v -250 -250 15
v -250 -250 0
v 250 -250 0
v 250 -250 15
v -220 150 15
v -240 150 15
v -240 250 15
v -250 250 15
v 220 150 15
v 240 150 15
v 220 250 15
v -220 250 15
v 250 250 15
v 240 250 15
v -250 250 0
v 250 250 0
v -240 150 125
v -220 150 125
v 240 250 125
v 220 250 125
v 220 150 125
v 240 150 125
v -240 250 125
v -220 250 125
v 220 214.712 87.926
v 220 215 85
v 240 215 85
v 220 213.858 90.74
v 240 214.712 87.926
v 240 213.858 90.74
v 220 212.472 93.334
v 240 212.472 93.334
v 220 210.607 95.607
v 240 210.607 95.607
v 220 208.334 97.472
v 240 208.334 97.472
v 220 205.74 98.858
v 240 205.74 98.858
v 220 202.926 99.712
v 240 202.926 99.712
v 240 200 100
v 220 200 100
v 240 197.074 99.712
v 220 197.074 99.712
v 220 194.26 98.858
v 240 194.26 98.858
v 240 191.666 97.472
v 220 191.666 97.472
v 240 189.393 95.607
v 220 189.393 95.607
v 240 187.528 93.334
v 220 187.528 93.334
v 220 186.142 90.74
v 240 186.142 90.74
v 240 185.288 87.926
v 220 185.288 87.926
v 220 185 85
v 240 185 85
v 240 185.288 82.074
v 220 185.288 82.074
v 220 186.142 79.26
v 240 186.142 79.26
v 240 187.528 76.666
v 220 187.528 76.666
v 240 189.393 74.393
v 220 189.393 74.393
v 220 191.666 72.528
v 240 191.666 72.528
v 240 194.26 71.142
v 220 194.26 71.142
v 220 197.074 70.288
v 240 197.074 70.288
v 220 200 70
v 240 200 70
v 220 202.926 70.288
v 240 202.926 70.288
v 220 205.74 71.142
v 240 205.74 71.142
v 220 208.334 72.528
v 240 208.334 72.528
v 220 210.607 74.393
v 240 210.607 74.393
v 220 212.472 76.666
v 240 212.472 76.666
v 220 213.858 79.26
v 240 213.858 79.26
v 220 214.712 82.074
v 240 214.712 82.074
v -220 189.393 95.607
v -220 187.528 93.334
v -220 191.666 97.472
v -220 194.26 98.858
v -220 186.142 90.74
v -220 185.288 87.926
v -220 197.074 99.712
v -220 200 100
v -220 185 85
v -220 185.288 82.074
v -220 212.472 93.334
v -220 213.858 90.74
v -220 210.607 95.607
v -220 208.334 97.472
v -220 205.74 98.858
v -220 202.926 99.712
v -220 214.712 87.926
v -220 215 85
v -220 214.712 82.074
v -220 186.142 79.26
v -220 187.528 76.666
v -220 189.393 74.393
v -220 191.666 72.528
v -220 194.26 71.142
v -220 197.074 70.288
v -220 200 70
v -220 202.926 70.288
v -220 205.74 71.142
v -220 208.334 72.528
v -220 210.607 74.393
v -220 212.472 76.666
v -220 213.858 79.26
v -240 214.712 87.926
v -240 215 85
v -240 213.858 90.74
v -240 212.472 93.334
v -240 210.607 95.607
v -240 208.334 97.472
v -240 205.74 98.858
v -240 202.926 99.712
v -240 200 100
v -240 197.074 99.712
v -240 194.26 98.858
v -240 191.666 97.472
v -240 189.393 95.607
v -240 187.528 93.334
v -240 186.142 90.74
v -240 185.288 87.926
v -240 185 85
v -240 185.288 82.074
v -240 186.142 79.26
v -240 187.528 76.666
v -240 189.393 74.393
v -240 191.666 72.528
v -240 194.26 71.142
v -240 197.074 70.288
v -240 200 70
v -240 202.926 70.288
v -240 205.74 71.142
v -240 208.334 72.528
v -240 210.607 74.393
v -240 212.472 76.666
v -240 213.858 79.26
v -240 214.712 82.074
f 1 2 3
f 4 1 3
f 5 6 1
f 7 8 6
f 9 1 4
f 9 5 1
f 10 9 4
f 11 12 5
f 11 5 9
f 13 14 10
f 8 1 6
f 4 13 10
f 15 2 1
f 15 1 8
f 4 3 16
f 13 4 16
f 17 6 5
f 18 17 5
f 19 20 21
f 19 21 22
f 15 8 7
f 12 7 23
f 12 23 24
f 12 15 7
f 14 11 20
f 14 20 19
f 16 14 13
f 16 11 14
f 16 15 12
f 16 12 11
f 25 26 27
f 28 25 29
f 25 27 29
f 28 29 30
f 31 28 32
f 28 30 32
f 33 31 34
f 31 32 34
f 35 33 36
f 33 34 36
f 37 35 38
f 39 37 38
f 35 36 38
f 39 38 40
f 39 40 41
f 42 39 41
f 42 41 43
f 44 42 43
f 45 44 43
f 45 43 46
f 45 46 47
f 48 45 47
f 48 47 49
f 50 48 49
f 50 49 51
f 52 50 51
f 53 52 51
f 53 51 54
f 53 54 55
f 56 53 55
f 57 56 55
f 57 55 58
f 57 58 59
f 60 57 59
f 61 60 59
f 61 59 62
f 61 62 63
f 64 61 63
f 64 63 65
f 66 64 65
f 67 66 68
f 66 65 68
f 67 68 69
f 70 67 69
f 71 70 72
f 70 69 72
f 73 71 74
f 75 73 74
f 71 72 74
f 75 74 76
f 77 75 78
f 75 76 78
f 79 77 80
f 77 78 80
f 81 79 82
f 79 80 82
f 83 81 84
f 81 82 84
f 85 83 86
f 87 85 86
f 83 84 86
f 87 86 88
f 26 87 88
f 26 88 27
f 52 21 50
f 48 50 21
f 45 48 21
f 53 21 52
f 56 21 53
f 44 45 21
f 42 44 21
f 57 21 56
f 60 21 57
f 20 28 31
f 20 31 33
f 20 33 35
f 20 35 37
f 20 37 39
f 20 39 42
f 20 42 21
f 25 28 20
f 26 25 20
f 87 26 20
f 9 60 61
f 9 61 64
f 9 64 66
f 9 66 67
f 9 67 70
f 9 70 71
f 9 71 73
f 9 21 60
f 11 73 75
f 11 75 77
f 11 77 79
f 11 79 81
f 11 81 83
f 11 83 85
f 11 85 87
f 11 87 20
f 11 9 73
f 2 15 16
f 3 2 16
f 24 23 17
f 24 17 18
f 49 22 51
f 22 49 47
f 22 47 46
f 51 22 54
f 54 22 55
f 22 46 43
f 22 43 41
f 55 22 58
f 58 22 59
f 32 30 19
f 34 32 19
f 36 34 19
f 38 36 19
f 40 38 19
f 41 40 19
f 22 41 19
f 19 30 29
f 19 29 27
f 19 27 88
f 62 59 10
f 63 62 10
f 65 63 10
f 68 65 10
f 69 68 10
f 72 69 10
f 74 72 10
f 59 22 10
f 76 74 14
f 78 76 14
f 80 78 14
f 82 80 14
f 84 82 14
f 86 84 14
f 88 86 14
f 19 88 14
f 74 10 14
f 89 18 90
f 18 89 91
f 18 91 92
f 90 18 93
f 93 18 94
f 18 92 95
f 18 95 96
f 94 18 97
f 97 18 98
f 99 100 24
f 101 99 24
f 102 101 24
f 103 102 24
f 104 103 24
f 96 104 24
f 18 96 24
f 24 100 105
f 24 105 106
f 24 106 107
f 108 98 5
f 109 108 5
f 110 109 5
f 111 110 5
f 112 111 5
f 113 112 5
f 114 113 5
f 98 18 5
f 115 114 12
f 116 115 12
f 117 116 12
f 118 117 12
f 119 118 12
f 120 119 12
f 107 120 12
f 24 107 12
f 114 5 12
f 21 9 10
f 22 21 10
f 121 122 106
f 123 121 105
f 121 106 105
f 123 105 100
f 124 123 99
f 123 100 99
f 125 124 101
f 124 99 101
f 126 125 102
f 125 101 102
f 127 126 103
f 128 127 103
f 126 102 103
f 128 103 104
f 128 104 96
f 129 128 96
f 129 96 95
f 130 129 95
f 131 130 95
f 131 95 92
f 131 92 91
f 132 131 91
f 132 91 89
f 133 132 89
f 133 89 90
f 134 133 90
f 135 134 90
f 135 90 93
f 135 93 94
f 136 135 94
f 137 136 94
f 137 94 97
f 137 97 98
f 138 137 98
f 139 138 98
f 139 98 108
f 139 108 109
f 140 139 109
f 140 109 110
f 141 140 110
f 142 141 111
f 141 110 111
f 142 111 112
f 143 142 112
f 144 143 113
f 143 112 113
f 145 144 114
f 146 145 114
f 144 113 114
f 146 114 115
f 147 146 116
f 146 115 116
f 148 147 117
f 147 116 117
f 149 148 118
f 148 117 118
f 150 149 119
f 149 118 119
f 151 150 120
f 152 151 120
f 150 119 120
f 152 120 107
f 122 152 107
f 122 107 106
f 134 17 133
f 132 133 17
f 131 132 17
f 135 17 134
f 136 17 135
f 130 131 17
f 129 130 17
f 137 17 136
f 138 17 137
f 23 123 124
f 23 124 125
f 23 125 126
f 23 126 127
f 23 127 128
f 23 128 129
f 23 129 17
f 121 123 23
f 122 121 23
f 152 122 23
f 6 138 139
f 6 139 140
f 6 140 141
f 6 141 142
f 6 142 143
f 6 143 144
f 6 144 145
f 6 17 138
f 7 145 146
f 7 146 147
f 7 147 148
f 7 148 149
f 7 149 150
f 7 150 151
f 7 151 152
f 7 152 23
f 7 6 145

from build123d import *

# Parameters (mm, degrees)
F0_W     = 500
F0_H     = 500
F1_DEPTH = 15
F2_W     = 20
F2_H     = 100
F3_DEPTH = 110
F4_R     = 15
F5_DEPTH = 490.001


with BuildPart() as f1:
    # F0 (on Top) → F1 (new body)
    with BuildSketch(Plane.XY):
        Rectangle(F0_W, F0_H)
    extrude(amount=F1_DEPTH)

    # F2 (on face) → F3 (join)
    with BuildSketch(Plane.XY.offset(15)):
        with Locations((230, 200)):
            Rectangle(F2_W, F2_H)
        with Locations((-230, 200)):
            Rectangle(F2_W, F2_H)
    extrude(amount=F3_DEPTH)

    # F4 (on face) → F5 (cut, through all)
    with BuildSketch(Plane.YZ.offset(240)):
        with Locations((200, 85)):
            Circle(F4_R)
    extrude(amount=-F5_DEPTH, mode=Mode.SUBTRACT)


solid = f1.part
